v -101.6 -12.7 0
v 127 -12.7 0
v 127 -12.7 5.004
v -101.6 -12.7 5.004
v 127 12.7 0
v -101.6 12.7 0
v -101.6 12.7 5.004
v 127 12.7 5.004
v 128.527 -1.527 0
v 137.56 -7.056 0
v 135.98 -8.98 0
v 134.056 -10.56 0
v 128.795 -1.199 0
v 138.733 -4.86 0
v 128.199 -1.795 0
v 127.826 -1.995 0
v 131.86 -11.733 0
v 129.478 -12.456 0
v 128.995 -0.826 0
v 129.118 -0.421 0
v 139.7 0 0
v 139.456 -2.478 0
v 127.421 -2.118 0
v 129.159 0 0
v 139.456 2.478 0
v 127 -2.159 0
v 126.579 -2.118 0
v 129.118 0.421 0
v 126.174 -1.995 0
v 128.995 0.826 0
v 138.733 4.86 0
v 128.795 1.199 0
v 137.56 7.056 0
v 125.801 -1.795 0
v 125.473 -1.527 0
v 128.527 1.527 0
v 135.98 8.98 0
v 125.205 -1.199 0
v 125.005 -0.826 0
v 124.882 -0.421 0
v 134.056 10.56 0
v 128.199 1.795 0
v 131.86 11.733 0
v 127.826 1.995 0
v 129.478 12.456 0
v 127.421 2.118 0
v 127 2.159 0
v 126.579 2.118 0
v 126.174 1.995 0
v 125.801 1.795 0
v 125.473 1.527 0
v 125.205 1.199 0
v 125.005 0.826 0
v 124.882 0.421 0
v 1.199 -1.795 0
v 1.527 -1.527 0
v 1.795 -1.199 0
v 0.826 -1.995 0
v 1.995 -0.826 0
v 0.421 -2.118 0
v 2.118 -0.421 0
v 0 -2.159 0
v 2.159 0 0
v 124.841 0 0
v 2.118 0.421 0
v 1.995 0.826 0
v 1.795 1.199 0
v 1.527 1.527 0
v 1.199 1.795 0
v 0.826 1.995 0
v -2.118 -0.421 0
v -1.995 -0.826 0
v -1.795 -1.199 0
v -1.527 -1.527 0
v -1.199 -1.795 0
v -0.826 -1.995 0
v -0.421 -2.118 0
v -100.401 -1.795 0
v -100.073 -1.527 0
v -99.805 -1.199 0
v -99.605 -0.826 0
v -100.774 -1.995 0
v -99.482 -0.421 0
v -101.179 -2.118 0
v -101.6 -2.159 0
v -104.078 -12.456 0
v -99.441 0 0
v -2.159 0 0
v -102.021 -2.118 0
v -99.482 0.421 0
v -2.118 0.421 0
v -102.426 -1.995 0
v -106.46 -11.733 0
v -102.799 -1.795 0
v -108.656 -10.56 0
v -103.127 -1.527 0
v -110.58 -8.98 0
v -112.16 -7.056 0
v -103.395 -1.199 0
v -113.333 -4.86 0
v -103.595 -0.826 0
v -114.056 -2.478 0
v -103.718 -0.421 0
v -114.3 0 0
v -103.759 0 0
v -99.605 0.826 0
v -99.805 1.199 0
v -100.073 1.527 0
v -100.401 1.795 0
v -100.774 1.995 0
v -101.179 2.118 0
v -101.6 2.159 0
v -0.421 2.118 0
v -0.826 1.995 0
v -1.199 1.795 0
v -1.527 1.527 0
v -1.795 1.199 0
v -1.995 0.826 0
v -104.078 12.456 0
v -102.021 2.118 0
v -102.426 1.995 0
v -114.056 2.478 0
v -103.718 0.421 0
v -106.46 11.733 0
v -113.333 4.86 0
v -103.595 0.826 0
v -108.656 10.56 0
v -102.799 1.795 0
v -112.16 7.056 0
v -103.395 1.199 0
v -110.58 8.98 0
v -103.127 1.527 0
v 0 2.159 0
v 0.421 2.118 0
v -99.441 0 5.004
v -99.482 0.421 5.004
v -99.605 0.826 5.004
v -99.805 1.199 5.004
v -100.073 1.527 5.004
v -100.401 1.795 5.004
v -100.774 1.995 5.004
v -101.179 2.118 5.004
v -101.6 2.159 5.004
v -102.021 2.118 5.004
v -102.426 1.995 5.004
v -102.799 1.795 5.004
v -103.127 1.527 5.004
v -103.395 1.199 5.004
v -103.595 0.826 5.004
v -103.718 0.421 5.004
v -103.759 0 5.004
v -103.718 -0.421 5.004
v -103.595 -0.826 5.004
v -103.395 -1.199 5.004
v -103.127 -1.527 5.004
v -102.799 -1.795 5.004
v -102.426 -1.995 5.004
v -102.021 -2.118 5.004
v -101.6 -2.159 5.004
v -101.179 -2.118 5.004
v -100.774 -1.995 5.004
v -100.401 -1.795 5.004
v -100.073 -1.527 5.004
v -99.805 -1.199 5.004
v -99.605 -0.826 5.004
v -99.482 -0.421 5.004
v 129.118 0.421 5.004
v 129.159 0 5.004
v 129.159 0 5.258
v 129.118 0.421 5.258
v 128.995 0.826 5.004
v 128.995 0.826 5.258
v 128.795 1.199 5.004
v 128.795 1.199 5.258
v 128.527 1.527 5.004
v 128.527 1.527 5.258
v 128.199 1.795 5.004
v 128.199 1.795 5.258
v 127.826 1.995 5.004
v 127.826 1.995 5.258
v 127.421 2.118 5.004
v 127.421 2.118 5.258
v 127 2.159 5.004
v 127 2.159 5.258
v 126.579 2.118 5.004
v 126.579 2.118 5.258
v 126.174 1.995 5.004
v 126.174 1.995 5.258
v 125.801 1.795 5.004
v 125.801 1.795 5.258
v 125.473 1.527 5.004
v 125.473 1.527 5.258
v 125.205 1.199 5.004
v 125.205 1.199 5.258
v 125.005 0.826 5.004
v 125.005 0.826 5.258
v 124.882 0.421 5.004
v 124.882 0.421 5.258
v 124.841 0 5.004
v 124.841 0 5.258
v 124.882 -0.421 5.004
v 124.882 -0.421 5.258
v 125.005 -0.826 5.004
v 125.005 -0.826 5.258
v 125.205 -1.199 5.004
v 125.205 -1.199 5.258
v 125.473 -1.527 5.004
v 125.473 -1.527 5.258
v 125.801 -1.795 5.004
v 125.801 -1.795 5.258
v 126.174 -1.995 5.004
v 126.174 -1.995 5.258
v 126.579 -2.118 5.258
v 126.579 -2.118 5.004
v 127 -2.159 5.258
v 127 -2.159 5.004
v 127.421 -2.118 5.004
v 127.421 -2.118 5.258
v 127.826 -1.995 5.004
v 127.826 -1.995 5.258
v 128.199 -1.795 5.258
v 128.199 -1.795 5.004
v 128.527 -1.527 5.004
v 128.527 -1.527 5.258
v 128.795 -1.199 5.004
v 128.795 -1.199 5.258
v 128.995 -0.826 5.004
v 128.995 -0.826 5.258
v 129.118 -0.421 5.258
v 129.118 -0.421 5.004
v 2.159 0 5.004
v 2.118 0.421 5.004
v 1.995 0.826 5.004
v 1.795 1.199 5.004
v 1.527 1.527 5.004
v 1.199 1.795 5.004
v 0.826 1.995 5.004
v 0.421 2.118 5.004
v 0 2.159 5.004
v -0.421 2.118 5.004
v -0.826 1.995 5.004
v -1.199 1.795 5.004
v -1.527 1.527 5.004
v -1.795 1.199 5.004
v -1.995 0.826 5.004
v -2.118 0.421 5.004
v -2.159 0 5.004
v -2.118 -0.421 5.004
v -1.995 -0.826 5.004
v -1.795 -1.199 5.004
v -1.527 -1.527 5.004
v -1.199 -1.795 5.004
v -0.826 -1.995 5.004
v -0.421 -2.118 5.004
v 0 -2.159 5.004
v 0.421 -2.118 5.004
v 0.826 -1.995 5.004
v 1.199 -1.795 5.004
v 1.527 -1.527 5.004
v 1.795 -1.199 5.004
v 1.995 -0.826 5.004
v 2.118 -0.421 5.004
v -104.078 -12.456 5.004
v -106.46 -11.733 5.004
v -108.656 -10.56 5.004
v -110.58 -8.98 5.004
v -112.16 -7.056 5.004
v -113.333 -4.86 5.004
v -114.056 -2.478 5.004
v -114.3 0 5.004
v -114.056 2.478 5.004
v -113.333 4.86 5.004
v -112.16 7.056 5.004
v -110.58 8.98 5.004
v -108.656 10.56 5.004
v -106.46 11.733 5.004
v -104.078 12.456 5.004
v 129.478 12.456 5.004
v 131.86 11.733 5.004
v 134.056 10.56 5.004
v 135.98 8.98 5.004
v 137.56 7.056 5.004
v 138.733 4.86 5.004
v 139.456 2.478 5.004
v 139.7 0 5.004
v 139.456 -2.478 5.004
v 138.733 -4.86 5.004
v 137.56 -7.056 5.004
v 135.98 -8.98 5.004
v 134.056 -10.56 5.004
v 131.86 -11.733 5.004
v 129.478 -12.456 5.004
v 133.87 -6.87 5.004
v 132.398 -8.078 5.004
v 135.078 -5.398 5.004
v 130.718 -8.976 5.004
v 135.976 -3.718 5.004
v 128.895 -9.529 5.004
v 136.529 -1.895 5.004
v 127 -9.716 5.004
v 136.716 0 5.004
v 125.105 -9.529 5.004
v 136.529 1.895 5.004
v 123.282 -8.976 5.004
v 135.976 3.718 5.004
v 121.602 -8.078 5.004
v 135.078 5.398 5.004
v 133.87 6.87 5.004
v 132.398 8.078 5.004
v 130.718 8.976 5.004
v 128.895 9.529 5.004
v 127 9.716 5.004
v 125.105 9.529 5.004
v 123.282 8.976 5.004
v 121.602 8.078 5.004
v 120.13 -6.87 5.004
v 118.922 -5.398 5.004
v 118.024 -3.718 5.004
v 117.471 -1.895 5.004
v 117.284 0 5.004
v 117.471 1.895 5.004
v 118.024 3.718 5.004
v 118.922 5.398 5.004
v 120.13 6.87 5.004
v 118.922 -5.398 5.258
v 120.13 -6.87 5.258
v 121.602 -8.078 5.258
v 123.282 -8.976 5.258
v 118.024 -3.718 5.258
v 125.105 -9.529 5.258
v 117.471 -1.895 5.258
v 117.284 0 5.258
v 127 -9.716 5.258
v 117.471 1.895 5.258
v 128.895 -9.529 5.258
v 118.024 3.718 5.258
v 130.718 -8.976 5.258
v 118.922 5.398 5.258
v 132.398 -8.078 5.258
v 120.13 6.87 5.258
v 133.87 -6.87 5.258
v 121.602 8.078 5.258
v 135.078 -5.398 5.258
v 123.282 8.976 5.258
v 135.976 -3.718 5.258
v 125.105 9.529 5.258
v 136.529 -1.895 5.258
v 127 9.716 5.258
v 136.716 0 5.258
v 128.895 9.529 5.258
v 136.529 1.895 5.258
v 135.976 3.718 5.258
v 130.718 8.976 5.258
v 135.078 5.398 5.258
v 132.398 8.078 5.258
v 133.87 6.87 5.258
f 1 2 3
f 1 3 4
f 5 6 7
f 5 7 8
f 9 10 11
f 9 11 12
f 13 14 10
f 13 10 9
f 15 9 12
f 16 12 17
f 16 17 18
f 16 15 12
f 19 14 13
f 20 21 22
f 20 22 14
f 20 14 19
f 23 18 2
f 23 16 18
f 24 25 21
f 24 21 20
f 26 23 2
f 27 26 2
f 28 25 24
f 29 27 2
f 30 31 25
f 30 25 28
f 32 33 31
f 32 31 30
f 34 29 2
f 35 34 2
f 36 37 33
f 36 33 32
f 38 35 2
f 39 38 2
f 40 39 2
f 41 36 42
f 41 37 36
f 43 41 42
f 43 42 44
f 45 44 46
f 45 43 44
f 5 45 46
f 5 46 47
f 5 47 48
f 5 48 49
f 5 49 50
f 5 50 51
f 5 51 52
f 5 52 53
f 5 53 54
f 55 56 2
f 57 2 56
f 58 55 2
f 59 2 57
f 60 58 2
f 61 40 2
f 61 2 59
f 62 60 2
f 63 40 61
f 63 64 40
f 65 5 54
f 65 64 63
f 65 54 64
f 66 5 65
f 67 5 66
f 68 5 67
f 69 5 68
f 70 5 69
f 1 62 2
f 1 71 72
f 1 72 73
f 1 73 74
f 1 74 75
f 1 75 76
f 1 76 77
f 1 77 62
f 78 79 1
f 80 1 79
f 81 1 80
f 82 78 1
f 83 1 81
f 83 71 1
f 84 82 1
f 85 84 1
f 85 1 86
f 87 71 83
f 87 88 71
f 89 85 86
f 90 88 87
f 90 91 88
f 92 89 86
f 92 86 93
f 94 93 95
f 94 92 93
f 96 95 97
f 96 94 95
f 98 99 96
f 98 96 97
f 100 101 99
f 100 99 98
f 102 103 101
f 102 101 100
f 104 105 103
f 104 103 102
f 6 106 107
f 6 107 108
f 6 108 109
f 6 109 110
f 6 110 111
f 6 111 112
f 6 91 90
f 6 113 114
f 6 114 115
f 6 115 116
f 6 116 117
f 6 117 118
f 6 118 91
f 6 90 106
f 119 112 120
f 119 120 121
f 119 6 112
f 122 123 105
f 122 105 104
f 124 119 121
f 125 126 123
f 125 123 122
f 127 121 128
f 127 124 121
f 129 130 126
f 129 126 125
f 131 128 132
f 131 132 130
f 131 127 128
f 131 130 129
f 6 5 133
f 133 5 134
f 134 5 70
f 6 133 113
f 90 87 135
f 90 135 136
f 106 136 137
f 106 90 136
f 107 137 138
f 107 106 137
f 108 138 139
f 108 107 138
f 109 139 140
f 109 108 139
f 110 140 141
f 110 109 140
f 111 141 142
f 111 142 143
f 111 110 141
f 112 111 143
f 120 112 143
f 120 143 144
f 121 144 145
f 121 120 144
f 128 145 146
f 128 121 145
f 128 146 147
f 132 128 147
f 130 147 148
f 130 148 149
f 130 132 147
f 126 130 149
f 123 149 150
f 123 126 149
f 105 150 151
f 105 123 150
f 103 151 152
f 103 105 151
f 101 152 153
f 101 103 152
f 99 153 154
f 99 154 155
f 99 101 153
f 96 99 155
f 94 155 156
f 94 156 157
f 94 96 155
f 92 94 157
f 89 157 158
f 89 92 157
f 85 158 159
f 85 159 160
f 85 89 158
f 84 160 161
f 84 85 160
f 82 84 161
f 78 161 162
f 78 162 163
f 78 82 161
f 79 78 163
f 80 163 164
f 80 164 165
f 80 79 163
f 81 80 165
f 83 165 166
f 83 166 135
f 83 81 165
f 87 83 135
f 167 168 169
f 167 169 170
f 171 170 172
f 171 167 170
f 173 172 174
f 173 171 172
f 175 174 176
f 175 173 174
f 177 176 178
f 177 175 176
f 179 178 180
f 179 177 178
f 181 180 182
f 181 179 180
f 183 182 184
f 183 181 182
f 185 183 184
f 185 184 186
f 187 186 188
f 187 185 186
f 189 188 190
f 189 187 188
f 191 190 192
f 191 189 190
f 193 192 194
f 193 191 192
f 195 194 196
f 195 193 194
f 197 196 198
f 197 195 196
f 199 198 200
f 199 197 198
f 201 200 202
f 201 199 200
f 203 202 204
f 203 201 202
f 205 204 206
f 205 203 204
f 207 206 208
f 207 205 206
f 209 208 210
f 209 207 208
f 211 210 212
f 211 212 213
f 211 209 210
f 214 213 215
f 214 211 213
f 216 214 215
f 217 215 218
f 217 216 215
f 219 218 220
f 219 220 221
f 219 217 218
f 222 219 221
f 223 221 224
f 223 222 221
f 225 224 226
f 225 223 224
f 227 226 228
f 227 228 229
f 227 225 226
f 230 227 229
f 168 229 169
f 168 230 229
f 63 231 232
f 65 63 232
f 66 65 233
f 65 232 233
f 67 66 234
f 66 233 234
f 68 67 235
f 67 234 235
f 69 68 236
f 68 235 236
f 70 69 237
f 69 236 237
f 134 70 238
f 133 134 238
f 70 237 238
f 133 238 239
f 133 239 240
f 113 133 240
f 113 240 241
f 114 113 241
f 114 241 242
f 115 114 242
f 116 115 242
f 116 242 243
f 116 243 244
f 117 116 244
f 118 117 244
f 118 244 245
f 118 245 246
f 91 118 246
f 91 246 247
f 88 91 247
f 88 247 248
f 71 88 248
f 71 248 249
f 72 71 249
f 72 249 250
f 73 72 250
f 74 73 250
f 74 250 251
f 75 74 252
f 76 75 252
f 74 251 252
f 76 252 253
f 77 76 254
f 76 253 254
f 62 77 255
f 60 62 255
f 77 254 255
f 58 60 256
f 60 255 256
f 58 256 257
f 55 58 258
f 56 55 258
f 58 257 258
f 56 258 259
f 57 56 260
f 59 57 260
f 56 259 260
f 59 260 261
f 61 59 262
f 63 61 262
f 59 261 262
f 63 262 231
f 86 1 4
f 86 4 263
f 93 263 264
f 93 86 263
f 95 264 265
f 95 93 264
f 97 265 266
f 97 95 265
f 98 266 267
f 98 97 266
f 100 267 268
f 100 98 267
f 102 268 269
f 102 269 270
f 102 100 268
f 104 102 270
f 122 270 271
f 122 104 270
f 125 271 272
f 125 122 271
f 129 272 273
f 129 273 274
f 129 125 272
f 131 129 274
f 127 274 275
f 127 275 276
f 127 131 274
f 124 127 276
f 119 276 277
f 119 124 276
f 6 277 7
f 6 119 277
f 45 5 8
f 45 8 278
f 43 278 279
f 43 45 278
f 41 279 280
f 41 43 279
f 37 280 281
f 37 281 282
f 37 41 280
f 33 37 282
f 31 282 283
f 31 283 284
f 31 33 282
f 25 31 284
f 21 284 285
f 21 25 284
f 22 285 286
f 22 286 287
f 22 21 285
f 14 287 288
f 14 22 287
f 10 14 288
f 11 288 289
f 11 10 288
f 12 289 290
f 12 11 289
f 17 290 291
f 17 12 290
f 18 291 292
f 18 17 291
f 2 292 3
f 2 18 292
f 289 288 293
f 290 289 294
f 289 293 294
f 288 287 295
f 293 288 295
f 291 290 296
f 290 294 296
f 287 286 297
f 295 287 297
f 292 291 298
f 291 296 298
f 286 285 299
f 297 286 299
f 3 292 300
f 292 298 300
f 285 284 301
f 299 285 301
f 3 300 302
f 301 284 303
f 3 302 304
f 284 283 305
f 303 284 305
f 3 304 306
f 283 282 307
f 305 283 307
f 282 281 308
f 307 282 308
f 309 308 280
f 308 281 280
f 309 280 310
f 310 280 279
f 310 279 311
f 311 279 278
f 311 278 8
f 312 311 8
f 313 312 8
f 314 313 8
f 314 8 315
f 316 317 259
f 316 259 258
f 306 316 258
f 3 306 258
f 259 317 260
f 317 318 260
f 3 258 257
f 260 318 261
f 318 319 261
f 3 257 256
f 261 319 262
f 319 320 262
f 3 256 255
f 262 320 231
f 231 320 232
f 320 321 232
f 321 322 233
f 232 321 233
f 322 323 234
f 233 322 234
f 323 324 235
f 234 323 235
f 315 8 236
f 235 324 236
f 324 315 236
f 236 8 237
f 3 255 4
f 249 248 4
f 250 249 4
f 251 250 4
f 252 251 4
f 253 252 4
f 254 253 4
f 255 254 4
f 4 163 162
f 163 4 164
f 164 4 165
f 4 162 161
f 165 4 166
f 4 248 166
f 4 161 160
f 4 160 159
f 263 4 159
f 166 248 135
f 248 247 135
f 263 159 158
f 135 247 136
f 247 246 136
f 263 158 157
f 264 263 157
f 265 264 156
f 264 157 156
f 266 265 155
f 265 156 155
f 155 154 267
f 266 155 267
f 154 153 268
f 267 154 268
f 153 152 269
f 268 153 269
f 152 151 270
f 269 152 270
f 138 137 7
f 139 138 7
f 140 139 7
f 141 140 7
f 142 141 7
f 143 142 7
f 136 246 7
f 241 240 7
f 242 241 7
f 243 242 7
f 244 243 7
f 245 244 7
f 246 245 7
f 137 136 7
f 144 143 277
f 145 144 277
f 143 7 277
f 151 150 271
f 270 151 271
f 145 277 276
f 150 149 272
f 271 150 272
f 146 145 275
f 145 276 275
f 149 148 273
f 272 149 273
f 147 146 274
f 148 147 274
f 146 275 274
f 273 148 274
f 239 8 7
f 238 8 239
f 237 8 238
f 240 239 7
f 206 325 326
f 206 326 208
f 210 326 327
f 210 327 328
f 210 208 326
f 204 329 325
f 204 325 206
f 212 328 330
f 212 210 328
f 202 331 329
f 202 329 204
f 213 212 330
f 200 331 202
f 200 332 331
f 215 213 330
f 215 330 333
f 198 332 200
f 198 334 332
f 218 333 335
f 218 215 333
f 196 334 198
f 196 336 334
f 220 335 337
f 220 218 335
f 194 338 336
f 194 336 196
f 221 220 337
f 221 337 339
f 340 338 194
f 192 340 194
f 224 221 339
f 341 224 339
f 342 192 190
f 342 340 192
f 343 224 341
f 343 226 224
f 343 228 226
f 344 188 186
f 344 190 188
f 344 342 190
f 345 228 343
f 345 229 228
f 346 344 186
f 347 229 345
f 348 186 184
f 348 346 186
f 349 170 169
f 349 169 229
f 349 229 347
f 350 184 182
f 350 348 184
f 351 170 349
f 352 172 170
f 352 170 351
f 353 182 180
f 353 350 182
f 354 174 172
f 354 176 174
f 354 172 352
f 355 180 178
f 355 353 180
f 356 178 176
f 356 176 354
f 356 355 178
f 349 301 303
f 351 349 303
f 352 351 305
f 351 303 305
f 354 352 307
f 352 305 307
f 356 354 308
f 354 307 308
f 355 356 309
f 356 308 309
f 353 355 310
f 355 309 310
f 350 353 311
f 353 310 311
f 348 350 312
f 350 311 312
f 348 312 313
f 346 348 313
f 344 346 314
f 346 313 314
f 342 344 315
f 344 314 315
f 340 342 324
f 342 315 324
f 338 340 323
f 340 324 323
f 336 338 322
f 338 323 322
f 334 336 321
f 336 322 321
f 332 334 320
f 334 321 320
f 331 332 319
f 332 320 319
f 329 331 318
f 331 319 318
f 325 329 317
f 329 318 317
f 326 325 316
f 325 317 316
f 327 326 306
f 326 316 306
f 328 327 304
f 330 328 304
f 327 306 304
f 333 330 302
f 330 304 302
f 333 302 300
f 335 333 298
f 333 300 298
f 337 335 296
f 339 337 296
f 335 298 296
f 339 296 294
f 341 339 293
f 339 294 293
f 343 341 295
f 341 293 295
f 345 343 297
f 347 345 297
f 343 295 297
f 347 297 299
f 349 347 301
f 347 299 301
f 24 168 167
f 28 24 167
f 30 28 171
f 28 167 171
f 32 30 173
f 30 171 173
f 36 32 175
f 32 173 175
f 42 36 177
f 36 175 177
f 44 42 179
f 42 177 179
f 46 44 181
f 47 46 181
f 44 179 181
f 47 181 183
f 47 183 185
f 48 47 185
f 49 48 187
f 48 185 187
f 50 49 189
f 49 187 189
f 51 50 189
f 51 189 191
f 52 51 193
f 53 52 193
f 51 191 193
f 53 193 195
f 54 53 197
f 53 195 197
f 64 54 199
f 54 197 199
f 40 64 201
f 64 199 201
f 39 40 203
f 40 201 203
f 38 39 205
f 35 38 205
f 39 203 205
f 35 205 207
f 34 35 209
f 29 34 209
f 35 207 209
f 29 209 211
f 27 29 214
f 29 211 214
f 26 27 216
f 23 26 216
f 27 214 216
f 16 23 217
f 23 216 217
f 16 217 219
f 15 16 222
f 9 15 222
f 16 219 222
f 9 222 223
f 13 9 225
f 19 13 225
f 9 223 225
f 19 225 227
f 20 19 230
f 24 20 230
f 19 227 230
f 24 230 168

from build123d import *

# Parameters (mm, degrees)
SKETCH1_R                = 6.35
SKETCH1_R_2              = 2.159
BOSS_EXTRUDE1_DEPTH      = 5.0038
SKETCH6_R                = 9.715843696
SKETCH6_R_2              = 2.159
BOSS_EXTRUDE3_DEPTH      = 0.254
BOSS_EXTRUDE3_DEPTH_BACK = 5.0038
SKETCH2_R                = 2.159
CUT_EXTRUDE1_DEPTH       = 19.812


with BuildPart() as part:
    # Sketch1 → Boss-Extrude1 (new body)
    with BuildSketch(Plane.XY):
        with BuildLine():
            Line((-101.6, 12.7), (127, 12.7))
            ThreePointArc((127, 12.7), (139.7, 0), (127, -12.7))
            Line((127, -12.7), (-101.6, -12.7))
            ThreePointArc((-101.6, -12.7), (-114.3, 0), (-101.6, 12.7))
        make_face()
        with Locations((127, 0)):
            Circle(SKETCH1_R, mode=Mode.SUBTRACT)
        with Locations((-101.6, 0)):
            Circle(SKETCH1_R_2, mode=Mode.SUBTRACT)
    extrude(amount=BOSS_EXTRUDE1_DEPTH)

    # Sketch6 → Boss-Extrude3 (add, two sides)
    with BuildSketch(Plane.XY.offset(5.0038)) as boss_extrude3_sk:
        with Locations((127, 0)):
            Circle(SKETCH6_R)
        with Locations((127, 0)):
            Circle(SKETCH6_R_2, mode=Mode.SUBTRACT)
    extrude(amount=BOSS_EXTRUDE3_DEPTH)
    extrude(boss_extrude3_sk.sketch, amount=-BOSS_EXTRUDE3_DEPTH_BACK)

    # Sketch2 → Cut-Extrude1 (cut)
    with BuildSketch(Plane.XY.offset(5.0038)):
        Circle(SKETCH2_R)
    extrude(amount=-CUT_EXTRUDE1_DEPTH, mode=Mode.SUBTRACT)


solid = part.part
